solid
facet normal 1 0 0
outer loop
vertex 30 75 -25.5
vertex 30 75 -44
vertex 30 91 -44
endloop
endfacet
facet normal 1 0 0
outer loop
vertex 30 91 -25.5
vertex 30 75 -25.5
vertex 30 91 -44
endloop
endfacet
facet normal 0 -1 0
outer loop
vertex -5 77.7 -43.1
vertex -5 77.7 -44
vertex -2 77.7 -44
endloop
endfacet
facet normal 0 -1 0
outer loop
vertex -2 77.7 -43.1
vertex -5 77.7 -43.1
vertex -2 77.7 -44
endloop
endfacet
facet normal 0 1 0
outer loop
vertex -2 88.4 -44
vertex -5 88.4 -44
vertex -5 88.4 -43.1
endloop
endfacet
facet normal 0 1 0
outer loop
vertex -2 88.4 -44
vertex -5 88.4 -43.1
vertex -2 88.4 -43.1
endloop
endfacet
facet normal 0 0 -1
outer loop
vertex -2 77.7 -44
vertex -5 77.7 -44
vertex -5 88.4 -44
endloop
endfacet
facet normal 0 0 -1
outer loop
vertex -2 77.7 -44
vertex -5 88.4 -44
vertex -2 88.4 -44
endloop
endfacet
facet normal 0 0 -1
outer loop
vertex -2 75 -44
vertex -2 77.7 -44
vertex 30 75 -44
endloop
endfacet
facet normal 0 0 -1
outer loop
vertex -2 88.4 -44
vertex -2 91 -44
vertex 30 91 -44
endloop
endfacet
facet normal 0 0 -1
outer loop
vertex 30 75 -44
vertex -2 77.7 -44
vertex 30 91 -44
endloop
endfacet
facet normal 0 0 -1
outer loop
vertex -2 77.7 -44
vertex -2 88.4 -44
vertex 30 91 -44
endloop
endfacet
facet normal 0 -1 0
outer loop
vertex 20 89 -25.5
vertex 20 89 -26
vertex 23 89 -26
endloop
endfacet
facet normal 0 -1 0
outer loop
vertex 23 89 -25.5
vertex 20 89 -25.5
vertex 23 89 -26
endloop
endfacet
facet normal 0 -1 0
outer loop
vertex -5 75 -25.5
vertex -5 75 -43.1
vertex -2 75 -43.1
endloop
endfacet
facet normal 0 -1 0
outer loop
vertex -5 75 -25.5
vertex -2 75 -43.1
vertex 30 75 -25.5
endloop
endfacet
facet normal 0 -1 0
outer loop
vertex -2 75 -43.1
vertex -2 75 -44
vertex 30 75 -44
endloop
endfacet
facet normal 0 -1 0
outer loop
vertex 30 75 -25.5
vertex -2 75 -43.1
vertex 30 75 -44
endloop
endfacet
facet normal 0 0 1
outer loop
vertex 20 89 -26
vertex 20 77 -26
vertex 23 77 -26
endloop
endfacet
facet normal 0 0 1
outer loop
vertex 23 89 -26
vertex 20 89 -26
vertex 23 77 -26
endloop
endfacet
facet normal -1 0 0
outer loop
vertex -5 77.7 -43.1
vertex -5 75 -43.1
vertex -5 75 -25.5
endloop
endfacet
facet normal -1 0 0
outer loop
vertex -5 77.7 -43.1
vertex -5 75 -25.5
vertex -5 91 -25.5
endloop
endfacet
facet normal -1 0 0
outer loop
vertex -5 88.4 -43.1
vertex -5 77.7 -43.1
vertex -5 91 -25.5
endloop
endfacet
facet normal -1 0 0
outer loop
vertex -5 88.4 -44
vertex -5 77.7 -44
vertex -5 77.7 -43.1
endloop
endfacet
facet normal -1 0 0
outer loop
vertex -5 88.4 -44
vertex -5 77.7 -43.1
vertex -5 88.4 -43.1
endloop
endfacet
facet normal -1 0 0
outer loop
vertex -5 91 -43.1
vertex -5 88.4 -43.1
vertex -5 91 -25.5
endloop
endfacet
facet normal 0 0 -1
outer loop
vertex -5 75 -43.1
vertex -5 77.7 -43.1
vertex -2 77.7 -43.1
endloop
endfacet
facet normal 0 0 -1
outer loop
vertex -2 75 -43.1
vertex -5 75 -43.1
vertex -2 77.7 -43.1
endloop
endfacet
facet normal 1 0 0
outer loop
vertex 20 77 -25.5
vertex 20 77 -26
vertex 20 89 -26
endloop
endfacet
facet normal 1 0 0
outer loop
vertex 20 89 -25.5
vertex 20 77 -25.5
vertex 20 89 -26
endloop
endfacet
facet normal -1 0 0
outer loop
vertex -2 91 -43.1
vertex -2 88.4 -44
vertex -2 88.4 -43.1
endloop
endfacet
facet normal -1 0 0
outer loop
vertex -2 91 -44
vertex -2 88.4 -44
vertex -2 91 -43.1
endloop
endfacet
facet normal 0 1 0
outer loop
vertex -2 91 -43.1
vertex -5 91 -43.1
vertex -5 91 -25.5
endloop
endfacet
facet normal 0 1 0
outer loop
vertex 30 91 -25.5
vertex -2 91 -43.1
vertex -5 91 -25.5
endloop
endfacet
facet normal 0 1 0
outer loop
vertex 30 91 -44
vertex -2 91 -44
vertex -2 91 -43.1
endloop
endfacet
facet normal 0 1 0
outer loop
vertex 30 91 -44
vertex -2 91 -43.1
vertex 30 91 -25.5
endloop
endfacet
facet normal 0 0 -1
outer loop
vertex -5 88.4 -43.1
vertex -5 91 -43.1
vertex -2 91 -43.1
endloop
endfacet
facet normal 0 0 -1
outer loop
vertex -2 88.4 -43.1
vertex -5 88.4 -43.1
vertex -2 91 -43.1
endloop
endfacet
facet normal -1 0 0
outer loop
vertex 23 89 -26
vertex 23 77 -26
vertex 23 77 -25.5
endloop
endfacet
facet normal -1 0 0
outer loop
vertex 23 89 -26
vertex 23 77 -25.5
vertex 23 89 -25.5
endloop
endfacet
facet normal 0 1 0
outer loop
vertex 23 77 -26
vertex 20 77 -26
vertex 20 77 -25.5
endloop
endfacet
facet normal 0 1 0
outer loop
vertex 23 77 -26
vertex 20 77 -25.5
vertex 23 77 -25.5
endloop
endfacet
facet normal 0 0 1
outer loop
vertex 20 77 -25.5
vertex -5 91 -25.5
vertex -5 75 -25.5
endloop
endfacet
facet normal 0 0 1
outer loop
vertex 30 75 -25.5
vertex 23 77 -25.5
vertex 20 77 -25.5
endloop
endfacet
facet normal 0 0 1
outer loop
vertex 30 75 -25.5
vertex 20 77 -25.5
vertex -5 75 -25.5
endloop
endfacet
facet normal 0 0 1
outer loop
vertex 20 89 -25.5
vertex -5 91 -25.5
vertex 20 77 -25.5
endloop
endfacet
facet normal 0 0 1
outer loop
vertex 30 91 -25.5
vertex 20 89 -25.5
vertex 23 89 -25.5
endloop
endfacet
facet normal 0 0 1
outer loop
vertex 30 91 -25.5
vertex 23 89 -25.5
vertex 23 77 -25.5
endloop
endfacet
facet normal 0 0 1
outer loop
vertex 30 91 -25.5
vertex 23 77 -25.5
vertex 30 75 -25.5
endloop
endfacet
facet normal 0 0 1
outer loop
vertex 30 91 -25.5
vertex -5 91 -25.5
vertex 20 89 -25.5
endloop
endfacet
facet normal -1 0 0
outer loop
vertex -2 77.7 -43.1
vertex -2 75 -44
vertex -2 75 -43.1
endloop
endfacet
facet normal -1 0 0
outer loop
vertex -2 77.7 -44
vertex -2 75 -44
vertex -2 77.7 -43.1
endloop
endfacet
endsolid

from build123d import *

# Parameters (mm, degrees)
BOX005014_W     = 3
BOX005014_H     = 12
BOX005014_DEPTH = 2
BOX005012_W     = 3
BOX005012_H     = 2.7
BOX005012_DEPTH = 2.7
BOX005011_W     = 3
BOX005011_H     = 2.7
BOX005011_DEPTH = 2.7
BOX005009_W     = 35
BOX005009_H     = 16
BOX005009_DEPTH = 18.5


with BuildPart() as krychle013:
    # Box005014 → Box005014 (new body)
    with BuildSketch(Plane(origin=(20, 77, -26), x_dir=(1, 0, 0), z_dir=(0, 0, 1))):
        with Locations((1.5, 6)):
            Rectangle(BOX005014_W, BOX005014_H)
    extrude(amount=BOX005014_DEPTH)


with BuildPart() as krychle011:
    # Box005012 → Box005012 (new body)
    with BuildSketch(Plane(origin=(-5, 88.4, -45.8), x_dir=(1, 0, 0), z_dir=(0, 0, 1))):
        with Locations((1.5, 1.35)):
            Rectangle(BOX005012_W, BOX005012_H)
    extrude(amount=BOX005012_DEPTH)


with BuildPart() as krychle010:
    # Box005011 → Box005011 (new body)
    with BuildSketch(Plane(origin=(-5, 75, -45.8), x_dir=(1, 0, 0), z_dir=(0, 0, 1))):
        with Locations((1.5, 1.35)):
            Rectangle(BOX005011_W, BOX005011_H)
    extrude(amount=BOX005011_DEPTH)


with BuildPart() as pro_rj001:
    # Box005009 → Box005009 (new body)
    with BuildSketch(Plane(origin=(-5, 75, -44), x_dir=(1, 0, 0), z_dir=(0, 0, 1))):
        with Locations((17.5, 8)):
            Rectangle(BOX005009_W, BOX005009_H)
    extrude(amount=BOX005009_DEPTH)

    # Cut: cut Krychle010
    add(krychle010.part, mode=Mode.SUBTRACT)

    # Cut001: cut Krychle011
    add(krychle011.part, mode=Mode.SUBTRACT)

    # Cut002: cut Krychle013
    add(krychle013.part, mode=Mode.SUBTRACT)


solid = pro_rj001.part
